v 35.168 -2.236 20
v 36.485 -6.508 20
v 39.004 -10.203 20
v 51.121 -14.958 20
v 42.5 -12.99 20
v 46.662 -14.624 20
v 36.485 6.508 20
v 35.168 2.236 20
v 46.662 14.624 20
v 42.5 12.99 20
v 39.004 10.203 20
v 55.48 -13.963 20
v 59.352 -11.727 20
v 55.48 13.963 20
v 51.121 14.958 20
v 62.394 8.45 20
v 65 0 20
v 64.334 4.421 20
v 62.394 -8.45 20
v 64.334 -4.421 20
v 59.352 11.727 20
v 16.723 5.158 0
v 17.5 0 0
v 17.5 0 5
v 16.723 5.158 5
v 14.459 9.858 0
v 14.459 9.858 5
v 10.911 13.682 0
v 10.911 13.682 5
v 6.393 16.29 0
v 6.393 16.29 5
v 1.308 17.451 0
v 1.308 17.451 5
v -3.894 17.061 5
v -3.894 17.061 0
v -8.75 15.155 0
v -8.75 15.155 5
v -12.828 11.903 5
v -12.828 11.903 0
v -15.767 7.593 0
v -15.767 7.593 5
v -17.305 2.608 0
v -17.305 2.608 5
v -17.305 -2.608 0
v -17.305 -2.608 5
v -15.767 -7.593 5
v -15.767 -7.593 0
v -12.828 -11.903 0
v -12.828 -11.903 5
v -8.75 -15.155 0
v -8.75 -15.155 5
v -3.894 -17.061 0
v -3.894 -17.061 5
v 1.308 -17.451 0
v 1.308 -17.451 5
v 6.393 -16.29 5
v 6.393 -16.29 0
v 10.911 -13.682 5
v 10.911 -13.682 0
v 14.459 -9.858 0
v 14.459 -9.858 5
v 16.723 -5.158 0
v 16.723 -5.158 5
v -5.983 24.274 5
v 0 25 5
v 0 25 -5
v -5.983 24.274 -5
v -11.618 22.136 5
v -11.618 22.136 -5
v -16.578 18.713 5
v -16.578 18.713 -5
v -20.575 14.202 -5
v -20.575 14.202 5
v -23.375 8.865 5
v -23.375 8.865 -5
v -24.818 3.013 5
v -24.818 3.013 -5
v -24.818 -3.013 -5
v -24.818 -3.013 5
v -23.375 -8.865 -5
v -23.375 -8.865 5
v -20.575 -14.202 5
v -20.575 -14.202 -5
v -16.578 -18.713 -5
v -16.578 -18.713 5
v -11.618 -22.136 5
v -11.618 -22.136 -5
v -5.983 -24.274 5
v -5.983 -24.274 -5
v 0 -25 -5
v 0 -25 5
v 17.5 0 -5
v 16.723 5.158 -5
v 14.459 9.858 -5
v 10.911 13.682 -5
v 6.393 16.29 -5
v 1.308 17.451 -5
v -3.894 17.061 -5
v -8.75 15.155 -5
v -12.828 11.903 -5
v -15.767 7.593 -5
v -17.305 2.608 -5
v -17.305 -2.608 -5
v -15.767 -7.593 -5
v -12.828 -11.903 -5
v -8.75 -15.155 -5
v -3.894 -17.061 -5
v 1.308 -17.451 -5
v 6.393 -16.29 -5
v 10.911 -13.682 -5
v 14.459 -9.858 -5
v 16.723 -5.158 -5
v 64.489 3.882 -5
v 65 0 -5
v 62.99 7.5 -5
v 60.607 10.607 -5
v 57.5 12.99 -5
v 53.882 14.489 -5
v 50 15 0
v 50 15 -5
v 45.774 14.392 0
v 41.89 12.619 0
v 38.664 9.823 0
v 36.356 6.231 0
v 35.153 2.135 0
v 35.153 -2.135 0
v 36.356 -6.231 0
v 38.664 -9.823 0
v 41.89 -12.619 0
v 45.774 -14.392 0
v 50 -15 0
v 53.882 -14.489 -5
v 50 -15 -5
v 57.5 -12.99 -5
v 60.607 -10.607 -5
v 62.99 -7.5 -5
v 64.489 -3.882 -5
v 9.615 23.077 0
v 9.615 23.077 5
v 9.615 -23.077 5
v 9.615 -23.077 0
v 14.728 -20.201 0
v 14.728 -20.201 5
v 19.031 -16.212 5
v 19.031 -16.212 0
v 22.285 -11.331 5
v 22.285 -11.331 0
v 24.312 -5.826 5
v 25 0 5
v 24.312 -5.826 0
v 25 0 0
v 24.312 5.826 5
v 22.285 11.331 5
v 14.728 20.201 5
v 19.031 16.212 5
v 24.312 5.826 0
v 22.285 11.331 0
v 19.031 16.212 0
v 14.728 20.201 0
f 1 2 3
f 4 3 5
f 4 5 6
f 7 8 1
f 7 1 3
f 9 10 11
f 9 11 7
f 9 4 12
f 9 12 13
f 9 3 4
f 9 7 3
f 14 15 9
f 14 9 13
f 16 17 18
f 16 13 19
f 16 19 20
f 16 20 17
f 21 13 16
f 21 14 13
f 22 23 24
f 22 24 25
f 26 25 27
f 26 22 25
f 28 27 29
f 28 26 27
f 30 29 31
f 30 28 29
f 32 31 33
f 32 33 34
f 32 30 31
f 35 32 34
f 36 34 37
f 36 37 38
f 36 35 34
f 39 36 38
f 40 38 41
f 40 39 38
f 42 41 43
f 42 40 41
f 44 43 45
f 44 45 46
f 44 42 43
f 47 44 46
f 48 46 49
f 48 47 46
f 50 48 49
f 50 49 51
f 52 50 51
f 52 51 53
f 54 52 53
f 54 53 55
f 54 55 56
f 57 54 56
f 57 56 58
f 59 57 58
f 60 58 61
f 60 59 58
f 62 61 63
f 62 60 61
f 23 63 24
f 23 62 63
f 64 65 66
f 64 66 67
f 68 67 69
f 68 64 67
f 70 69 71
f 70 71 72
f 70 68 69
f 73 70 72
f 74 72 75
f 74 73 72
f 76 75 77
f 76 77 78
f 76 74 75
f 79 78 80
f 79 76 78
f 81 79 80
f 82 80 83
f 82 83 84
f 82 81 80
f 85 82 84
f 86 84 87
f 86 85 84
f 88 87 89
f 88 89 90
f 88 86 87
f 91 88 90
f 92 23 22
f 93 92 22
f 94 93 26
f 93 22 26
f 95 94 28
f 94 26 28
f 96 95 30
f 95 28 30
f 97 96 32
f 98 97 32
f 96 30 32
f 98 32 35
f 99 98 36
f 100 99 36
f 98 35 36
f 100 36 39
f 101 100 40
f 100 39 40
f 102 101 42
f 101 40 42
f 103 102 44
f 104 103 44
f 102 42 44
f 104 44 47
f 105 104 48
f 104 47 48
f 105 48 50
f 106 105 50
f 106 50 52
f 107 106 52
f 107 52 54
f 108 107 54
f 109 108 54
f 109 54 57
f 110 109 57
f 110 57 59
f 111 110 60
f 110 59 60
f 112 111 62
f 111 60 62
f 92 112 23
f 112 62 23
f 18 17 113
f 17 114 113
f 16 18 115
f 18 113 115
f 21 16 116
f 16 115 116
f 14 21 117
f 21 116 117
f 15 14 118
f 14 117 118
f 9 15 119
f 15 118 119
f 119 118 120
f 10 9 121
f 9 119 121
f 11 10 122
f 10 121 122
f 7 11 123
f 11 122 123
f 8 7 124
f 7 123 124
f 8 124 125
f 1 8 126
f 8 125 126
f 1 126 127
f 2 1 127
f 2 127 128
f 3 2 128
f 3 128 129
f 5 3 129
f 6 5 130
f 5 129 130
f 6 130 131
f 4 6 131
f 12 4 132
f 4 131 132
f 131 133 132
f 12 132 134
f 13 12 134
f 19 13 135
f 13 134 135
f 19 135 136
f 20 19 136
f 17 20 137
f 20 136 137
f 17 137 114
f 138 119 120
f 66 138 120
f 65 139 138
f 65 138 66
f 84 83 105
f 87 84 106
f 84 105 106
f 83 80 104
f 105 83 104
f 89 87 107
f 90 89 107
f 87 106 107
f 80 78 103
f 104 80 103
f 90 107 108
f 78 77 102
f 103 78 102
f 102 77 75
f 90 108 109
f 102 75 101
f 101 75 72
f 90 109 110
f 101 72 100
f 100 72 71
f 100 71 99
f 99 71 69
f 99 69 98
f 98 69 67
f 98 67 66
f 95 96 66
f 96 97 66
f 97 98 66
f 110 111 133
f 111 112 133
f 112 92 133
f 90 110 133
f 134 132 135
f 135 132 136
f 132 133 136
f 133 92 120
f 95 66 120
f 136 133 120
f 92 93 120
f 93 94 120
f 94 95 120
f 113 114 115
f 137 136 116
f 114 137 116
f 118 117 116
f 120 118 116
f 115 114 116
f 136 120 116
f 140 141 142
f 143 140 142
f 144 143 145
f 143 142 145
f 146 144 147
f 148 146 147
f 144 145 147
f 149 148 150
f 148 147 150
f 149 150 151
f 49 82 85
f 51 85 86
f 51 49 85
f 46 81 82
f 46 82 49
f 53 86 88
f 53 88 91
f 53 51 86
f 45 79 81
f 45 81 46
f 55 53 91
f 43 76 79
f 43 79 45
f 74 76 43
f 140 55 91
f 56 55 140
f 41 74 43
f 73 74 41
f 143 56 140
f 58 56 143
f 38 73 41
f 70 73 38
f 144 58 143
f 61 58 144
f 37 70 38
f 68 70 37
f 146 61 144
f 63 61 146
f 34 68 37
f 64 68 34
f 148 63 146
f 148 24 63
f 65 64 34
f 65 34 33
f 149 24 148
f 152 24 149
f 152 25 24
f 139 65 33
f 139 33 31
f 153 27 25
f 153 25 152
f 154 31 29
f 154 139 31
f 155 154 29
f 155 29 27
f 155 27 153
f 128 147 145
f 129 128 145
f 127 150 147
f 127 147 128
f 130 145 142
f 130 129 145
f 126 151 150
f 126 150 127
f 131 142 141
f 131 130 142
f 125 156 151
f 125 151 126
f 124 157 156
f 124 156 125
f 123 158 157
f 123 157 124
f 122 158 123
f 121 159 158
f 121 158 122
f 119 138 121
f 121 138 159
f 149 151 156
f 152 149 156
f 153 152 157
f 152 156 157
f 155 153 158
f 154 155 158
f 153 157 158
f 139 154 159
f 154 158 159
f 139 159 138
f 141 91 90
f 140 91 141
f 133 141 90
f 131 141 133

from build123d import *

# Parameters (mm, degrees)
BOSS_EXTRUDE1_DEPTH      = 5
SKETCH1_3_R              = 15
BOSS_EXTRUDE2_DEPTH      = 20
BOSS_EXTRUDE2_DEPTH_BACK = 5
SKETCH1_4_R              = 17.5
BOSS_EXTRUDE3_DEPTH      = 5
BOSS_EXTRUDE3_DEPTH_BACK = 5


with BuildPart() as part:
    # Sketch1 → Boss-Extrude1 (new body)
    with BuildSketch(Plane.XY):
        with BuildLine():
            Line((50, 15), (9.615384615, 23.076923077))
            ThreePointArc((9.615384615, 23.076923077), (20.801257358, 13.867504906), (25, 0))
            ThreePointArc((25, 0), (20.801257358, -13.867504906), (9.615384615, -23.076923077))
            Line((9.615384615, -23.076923077), (50, -15))
            ThreePointArc((50, -15), (35, 0), (50, 15))
        make_face()
    extrude(amount=-BOSS_EXTRUDE1_DEPTH)

    # Sketch1_3 → Boss-Extrude2 (add, two sides)
    with BuildSketch(Plane.XY) as boss_extrude2_sk:
        with Locations((50, 0)):
            Circle(SKETCH1_3_R)
    extrude(amount=BOSS_EXTRUDE2_DEPTH)
    extrude(boss_extrude2_sk.sketch, amount=-BOSS_EXTRUDE2_DEPTH_BACK)

    # Sketch1_4 → Boss-Extrude3 (add, two sides)
    with BuildSketch(Plane.XY) as boss_extrude3_sk:
        with BuildLine():
            Line((9.615384615, 23.076923077), (0, 25))
            ThreePointArc((0, 25), (-25, 0), (0, -25))
            Line((0, -25), (9.615384615, -23.076923077))
            ThreePointArc((9.615384615, -23.076923077), (20.801257358, -13.867504906), (25, 0))
            ThreePointArc((25, 0), (20.801257358, 13.867504906), (9.615384615, 23.076923077))
        make_face()
        Circle(SKETCH1_4_R, mode=Mode.SUBTRACT)
    extrude(amount=BOSS_EXTRUDE3_DEPTH)
    extrude(boss_extrude3_sk.sketch, amount=-BOSS_EXTRUDE3_DEPTH_BACK)


solid = part.part
